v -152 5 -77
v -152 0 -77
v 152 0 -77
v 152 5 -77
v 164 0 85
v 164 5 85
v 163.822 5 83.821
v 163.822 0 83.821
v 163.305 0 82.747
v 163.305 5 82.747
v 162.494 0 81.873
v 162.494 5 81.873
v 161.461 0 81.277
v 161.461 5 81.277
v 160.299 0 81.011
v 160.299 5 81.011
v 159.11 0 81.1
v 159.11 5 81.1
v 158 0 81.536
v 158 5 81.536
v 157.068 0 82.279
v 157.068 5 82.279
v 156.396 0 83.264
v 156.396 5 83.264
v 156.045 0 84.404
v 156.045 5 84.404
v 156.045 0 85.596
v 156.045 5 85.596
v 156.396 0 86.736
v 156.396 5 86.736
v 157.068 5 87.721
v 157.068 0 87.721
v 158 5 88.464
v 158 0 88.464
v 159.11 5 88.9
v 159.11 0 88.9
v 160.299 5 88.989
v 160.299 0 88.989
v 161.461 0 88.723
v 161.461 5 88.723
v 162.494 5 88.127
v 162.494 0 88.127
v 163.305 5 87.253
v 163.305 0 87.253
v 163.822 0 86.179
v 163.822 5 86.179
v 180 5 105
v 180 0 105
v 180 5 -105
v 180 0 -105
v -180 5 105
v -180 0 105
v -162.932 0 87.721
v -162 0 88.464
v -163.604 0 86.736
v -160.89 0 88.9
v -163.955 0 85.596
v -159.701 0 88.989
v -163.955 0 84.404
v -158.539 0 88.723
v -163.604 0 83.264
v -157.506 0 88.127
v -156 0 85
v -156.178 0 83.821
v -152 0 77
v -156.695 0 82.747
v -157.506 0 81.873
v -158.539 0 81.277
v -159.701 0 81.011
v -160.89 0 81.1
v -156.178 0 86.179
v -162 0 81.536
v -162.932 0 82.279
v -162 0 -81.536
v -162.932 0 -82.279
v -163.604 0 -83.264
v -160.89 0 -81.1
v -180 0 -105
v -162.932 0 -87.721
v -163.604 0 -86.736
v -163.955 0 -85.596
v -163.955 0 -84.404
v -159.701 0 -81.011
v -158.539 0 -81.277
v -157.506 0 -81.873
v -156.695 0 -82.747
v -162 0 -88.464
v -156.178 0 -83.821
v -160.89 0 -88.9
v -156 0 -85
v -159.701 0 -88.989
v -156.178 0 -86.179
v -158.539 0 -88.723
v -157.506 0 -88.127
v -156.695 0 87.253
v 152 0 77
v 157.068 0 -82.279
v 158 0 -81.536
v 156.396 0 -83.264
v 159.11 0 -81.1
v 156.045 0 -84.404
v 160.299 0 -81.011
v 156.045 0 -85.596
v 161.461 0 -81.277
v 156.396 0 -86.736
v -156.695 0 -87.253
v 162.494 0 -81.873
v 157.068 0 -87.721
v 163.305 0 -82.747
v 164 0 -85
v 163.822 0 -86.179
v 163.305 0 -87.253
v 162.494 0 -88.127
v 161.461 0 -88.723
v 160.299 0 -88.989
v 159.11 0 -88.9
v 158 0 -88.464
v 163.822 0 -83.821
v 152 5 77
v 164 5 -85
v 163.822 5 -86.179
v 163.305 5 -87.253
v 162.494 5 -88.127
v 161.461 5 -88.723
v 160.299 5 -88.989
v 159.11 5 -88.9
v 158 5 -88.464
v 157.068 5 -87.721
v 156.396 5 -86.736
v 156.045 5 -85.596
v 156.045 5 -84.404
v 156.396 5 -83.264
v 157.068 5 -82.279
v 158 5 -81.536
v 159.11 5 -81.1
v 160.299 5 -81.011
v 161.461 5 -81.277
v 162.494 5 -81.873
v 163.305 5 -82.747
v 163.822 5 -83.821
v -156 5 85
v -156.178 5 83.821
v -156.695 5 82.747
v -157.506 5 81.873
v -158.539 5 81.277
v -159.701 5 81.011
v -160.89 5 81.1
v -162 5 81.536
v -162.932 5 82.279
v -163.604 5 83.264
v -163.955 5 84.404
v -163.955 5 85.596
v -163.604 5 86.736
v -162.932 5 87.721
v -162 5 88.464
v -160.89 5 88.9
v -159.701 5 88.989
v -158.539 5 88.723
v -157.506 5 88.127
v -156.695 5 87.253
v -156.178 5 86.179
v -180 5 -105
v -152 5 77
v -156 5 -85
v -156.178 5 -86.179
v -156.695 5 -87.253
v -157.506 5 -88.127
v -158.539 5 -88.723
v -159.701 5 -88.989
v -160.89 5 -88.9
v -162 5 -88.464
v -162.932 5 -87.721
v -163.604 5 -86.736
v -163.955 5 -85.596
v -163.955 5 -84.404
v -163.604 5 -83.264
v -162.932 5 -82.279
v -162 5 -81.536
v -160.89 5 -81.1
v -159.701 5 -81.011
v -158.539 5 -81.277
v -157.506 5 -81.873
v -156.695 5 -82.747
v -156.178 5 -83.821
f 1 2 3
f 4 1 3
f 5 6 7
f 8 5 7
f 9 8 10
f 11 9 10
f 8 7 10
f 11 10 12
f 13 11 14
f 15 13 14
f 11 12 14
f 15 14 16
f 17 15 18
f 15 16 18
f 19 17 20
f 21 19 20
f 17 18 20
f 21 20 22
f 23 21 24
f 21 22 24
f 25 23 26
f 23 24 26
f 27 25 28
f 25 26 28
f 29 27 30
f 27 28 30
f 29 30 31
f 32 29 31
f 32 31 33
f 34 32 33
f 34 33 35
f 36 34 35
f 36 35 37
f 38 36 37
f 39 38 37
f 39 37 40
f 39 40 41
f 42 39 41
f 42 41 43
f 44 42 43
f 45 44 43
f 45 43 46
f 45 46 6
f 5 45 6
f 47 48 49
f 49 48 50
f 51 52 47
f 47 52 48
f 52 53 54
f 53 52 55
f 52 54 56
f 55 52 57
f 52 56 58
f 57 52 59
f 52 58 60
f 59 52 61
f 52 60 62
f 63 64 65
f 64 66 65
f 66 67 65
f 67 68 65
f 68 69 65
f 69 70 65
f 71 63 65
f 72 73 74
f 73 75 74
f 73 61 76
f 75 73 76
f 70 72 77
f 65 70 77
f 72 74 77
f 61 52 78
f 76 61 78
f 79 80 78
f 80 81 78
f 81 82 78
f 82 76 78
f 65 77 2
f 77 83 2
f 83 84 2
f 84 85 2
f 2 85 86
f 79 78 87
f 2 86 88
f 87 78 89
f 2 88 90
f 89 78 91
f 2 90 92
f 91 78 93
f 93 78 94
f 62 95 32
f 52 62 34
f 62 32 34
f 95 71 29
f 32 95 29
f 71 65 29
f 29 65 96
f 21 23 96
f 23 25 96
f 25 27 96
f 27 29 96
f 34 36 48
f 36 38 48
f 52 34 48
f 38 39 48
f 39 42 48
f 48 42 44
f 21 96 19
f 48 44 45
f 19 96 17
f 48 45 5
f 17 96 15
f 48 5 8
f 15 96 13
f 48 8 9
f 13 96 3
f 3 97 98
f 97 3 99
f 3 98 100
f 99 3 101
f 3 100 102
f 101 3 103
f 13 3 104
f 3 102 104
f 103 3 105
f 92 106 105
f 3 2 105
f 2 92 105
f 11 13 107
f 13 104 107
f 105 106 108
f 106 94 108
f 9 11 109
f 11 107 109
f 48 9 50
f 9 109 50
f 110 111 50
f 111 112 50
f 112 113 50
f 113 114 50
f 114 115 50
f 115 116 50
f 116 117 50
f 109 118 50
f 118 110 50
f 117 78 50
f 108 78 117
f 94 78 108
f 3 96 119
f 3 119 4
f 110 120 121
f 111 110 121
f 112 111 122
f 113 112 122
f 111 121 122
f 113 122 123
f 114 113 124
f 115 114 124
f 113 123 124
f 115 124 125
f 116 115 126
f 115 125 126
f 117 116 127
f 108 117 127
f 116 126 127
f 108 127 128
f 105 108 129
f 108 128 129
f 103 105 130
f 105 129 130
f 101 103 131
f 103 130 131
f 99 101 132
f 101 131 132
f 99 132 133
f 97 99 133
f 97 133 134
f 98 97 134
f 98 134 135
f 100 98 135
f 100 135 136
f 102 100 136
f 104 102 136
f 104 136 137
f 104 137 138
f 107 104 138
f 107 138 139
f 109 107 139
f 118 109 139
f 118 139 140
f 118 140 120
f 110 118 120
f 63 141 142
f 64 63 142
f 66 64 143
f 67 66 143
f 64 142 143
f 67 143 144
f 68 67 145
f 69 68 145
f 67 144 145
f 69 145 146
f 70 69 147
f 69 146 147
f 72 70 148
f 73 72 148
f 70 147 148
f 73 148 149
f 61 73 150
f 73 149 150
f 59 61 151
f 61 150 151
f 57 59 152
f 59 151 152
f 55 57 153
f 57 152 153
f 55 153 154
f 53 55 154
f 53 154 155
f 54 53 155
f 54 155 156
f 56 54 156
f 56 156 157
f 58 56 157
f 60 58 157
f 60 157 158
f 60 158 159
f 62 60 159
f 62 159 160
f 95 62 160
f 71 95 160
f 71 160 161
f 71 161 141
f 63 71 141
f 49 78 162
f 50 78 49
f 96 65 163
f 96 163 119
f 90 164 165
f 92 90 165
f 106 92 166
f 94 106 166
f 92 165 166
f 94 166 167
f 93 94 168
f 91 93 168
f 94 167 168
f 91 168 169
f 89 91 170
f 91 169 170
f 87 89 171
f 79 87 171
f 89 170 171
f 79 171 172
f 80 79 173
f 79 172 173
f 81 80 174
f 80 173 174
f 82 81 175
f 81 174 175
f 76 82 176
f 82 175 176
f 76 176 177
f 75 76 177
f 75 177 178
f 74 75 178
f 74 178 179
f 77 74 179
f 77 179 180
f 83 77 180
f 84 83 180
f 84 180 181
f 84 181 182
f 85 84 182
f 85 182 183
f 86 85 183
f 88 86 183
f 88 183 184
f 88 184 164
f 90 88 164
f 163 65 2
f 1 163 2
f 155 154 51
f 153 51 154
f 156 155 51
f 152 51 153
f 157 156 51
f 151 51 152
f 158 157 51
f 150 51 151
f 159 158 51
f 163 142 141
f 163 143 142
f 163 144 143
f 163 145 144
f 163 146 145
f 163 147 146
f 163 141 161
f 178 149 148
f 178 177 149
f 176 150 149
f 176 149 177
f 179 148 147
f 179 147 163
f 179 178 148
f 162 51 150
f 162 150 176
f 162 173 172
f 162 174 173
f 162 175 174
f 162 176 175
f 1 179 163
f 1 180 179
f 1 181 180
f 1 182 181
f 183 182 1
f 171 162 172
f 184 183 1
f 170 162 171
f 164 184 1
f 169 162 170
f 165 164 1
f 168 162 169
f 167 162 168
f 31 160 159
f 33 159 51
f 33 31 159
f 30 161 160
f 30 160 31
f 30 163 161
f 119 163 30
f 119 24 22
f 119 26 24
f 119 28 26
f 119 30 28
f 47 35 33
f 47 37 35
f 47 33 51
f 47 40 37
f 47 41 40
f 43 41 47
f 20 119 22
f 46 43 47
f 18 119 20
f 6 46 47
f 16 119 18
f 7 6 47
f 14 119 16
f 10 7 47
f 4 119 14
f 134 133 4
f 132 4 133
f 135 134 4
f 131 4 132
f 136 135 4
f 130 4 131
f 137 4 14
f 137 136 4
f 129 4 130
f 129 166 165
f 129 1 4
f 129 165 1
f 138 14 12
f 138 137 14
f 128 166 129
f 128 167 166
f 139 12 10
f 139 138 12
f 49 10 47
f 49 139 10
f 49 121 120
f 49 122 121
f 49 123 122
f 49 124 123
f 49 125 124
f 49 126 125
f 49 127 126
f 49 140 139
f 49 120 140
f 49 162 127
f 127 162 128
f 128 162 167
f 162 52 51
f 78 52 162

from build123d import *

# Parameters (mm, degrees)
SKETCH1_W           = 360
SKETCH1_H           = 210
SKETCH1_W_2         = 304
SKETCH1_H_2         = 154
BOSS_EXTRUDE1_DEPTH = 5
SKETCH2_R           = 4
CUT_EXTRUDE1_DEPTH  = 10


with BuildPart() as part:
    # Sketch1 → Boss-Extrude1 (new body)
    with BuildSketch(Plane(origin=(0, 0, 0), x_dir=(1, 0, 0), z_dir=(0, 1, 0))):
        Rectangle(SKETCH1_W, SKETCH1_H)
        Rectangle(SKETCH1_W_2, SKETCH1_H_2, mode=Mode.SUBTRACT)
    extrude(amount=BOSS_EXTRUDE1_DEPTH)

    # Sketch2 → Cut-Extrude1 (cut)
    with BuildSketch(Plane(origin=(0, 5, 0), x_dir=(1, 0, 0), z_dir=(0, 1, 0))):
        with Locations((-160, -85)):
            Circle(SKETCH2_R)
        with Locations((160, -85)):
            Circle(SKETCH2_R)
        with Locations((160, 85)):
            Circle(SKETCH2_R)
        with Locations((-160, 85)):
            Circle(SKETCH2_R)
    extrude(amount=-CUT_EXTRUDE1_DEPTH, mode=Mode.SUBTRACT)


solid = part.part
